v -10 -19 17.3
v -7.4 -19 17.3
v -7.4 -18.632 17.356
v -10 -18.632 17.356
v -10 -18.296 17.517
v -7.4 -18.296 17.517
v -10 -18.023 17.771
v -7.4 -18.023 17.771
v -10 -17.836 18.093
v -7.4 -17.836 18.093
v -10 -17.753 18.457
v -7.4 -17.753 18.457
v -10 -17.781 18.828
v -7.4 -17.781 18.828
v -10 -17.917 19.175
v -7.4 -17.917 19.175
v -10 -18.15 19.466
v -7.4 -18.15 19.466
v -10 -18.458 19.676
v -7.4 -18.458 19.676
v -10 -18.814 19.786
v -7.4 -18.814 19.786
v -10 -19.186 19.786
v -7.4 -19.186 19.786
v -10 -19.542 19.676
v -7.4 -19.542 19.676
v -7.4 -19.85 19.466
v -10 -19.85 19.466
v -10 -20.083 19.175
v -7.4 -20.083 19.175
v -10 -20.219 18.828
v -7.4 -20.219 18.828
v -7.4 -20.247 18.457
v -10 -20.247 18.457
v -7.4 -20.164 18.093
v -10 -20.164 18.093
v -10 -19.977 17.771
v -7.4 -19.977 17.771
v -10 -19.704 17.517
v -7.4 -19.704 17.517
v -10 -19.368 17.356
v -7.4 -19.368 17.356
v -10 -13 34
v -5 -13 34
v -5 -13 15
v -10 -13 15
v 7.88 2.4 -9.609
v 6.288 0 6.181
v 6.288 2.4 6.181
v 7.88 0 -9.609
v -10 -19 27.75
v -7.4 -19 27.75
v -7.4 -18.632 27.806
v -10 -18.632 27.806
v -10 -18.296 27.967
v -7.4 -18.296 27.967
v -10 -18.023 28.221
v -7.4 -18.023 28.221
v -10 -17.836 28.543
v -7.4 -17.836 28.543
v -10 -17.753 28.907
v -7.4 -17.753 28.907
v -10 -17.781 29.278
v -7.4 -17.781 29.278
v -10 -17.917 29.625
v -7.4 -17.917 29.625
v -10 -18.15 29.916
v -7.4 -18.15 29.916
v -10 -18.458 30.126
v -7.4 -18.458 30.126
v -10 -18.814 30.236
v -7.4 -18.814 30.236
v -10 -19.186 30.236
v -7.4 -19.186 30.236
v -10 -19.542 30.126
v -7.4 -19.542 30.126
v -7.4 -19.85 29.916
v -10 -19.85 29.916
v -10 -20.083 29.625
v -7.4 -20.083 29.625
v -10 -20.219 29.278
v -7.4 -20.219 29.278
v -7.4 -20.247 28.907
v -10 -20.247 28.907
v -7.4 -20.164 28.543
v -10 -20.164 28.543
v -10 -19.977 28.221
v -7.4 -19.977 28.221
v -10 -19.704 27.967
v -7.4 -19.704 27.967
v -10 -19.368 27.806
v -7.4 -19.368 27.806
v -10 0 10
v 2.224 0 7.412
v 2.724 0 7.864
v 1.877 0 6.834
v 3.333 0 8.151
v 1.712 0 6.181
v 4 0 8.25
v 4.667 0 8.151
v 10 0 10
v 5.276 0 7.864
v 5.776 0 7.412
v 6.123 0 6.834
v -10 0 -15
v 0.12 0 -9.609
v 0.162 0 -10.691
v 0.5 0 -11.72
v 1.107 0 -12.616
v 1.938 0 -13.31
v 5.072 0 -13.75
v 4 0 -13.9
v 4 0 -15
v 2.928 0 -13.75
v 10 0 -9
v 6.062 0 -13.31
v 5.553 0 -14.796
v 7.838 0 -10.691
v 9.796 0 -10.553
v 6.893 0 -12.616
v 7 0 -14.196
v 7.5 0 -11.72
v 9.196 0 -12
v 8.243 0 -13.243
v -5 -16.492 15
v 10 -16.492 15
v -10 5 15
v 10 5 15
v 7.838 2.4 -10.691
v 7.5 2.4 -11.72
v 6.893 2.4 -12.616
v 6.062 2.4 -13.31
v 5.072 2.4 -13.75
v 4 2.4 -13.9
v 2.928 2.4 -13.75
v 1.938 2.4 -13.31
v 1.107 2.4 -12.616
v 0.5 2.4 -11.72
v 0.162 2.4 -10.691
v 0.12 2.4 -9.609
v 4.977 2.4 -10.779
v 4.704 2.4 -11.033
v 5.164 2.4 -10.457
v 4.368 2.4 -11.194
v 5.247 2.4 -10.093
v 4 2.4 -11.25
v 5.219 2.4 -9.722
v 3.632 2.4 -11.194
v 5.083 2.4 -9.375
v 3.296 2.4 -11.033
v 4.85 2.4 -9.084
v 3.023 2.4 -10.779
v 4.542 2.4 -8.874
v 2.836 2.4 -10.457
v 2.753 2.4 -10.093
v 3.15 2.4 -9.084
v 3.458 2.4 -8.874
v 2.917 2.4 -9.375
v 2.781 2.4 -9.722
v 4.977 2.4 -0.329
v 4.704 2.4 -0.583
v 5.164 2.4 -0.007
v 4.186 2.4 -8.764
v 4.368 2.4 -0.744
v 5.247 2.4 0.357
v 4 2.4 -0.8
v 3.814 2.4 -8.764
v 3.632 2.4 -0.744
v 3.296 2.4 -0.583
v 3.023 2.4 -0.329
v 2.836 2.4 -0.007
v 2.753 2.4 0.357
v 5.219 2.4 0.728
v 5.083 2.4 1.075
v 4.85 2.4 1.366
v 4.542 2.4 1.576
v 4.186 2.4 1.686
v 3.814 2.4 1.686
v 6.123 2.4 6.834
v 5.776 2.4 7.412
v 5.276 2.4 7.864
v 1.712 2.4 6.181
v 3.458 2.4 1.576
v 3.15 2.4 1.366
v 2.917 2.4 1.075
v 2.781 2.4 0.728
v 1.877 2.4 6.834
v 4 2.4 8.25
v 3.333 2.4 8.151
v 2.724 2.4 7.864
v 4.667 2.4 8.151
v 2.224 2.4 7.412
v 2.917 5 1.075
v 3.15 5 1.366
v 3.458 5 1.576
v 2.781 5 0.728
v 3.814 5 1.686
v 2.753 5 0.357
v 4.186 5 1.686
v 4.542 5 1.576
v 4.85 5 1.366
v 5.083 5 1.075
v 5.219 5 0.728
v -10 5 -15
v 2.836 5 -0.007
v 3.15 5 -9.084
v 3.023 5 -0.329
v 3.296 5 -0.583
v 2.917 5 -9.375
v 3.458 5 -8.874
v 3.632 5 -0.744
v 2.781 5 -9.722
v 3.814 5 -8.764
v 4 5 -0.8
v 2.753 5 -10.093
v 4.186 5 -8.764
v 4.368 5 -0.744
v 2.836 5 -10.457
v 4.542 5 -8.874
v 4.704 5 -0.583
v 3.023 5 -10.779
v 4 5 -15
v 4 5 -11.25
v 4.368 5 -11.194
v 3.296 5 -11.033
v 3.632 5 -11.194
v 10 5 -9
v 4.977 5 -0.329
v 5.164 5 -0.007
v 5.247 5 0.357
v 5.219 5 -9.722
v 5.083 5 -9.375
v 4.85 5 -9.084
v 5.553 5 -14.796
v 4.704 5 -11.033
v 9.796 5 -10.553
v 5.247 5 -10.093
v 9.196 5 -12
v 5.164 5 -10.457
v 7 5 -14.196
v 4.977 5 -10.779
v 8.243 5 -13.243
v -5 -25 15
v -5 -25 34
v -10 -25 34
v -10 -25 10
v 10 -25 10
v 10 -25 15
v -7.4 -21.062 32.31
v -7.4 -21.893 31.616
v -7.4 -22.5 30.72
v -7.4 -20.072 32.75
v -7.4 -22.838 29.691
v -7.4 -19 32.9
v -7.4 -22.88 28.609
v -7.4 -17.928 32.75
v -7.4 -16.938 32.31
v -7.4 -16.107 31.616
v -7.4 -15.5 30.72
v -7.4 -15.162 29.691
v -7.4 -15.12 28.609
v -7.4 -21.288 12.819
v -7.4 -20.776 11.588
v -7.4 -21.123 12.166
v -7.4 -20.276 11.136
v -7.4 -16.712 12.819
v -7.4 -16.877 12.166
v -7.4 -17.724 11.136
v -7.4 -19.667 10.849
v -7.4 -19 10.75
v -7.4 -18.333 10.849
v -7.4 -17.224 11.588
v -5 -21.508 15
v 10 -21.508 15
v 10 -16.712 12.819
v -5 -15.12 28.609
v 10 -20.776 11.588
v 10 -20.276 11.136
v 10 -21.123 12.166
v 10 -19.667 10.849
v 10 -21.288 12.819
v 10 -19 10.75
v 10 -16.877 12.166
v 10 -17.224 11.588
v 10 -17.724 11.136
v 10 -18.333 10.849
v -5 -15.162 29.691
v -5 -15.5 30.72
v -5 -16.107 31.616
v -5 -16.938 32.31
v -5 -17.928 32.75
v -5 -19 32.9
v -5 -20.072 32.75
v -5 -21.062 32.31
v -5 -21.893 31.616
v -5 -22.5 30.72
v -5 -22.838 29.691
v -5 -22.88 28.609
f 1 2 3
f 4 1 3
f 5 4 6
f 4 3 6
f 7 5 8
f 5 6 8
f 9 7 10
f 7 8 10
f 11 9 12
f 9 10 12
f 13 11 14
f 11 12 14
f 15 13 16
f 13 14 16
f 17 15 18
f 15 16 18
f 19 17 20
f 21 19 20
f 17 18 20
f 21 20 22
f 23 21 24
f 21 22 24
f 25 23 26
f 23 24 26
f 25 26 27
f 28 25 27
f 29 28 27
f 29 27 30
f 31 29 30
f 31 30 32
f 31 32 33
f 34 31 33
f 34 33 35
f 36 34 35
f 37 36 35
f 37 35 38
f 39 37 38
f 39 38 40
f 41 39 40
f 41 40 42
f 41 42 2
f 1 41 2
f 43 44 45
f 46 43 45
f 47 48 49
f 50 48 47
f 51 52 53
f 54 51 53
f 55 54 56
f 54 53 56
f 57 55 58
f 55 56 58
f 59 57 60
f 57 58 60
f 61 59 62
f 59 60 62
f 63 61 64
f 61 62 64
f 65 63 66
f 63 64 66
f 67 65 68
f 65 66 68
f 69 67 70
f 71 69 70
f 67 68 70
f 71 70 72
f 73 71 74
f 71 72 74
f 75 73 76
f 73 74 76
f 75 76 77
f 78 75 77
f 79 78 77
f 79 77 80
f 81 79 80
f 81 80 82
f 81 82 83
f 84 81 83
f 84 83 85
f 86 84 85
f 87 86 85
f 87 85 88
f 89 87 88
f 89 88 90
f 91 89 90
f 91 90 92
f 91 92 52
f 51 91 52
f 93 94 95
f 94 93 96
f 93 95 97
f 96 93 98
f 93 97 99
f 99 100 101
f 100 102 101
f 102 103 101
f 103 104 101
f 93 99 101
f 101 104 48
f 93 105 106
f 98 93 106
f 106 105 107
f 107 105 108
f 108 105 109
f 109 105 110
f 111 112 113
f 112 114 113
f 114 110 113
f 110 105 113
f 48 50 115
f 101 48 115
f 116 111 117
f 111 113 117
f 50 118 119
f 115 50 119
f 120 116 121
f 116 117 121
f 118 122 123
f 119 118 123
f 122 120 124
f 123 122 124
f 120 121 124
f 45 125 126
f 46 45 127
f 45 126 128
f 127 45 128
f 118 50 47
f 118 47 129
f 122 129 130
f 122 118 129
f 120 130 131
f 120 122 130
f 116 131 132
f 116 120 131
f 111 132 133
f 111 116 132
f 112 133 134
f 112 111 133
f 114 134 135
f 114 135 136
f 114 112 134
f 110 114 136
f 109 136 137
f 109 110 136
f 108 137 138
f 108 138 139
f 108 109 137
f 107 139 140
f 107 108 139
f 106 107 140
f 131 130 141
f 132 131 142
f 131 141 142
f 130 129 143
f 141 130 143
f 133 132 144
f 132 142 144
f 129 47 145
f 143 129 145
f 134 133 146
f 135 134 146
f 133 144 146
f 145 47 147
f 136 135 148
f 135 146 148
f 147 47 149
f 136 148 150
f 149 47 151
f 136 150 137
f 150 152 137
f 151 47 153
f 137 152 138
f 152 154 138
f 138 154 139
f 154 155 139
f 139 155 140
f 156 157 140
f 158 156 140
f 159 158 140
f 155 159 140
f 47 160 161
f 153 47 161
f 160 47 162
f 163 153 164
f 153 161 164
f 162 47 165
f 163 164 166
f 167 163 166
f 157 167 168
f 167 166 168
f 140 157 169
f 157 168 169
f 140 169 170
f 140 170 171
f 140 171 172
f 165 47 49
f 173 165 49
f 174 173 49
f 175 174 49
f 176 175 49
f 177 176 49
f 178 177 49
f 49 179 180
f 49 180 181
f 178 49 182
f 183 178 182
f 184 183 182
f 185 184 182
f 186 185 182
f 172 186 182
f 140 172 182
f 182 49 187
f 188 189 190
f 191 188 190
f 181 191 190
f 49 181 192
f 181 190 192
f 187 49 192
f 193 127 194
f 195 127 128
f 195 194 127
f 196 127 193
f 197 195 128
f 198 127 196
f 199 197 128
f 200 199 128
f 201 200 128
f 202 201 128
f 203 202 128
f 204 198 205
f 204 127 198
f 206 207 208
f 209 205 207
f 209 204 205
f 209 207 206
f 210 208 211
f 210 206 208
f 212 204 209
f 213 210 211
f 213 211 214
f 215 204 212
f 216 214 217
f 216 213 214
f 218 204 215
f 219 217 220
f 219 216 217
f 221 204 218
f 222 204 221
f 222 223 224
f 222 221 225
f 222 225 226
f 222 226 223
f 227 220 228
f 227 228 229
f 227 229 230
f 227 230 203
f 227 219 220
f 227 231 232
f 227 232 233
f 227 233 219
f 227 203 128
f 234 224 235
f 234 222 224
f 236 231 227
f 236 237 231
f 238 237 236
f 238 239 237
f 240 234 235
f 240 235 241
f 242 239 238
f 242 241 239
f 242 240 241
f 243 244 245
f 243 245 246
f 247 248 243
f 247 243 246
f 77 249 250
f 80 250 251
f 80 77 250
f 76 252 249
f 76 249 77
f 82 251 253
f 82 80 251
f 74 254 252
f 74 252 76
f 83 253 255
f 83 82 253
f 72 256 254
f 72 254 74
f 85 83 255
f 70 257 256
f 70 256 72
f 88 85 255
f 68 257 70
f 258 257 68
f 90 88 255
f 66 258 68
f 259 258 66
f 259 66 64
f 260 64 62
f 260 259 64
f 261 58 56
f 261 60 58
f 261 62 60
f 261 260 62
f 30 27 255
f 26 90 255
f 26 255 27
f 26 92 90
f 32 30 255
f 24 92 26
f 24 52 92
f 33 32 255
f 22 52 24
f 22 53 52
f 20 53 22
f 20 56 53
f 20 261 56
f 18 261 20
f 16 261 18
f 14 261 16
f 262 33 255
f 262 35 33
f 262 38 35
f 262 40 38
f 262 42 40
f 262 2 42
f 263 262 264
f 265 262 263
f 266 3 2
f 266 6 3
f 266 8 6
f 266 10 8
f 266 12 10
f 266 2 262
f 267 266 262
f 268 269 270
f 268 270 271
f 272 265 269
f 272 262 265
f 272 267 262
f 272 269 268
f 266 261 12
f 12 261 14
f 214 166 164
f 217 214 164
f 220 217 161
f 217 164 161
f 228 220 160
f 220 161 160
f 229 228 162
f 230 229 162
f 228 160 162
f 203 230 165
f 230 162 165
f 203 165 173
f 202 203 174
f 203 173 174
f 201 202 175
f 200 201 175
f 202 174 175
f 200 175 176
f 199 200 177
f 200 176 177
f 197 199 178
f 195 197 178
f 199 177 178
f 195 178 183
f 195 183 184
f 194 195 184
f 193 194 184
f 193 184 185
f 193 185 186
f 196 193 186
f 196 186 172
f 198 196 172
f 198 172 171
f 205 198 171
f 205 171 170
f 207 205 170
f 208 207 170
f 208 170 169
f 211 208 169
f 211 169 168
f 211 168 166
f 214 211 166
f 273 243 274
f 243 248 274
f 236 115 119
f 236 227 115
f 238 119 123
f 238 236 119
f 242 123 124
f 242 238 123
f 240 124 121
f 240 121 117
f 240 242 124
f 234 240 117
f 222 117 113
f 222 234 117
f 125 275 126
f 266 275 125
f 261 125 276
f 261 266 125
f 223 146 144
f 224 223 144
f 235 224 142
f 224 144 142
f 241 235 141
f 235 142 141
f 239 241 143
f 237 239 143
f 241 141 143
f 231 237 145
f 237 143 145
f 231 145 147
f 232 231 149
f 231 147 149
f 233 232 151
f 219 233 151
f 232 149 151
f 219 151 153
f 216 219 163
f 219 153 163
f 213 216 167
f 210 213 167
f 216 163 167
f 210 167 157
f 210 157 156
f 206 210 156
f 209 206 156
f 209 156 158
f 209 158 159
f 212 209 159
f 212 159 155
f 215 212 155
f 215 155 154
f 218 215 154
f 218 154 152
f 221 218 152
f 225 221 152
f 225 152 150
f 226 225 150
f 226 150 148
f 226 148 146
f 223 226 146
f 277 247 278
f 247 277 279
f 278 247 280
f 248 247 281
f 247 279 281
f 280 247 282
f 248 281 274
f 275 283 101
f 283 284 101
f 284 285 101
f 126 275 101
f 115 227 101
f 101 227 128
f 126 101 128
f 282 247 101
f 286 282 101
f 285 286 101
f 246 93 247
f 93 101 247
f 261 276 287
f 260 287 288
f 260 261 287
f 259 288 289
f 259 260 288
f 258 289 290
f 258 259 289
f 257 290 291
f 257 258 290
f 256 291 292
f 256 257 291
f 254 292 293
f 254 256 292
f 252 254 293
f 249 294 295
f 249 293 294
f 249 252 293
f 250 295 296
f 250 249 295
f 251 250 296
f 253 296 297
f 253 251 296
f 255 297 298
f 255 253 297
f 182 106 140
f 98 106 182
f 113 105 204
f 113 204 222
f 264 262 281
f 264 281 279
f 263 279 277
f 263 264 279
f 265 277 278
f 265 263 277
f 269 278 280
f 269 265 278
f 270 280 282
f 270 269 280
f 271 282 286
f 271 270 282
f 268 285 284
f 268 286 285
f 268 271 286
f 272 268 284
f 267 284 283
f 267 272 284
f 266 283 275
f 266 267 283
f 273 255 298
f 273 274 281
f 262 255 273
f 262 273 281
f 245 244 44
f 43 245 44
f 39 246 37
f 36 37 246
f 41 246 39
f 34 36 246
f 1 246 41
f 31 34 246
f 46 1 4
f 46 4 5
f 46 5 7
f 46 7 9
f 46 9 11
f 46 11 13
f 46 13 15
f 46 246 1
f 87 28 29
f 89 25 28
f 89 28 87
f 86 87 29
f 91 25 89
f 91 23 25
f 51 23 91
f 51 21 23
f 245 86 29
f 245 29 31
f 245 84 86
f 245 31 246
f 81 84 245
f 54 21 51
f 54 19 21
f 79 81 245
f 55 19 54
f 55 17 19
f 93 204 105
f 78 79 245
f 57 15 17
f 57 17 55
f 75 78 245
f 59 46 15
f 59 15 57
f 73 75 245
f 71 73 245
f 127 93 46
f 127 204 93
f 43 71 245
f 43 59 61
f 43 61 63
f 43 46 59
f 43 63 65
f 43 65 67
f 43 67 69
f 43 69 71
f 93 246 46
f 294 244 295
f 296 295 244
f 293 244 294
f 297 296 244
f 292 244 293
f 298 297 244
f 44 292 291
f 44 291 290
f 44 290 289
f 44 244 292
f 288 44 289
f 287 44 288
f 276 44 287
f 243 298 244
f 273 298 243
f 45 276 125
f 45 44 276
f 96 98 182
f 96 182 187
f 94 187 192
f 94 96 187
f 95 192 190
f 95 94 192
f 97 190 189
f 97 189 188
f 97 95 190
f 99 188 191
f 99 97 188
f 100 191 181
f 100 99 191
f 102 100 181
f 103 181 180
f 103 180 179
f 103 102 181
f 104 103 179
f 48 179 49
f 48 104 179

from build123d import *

# Parameters (mm, degrees)
SKETCH1_W               = 20
SKETCH1_H               = 30
BOSS_EXTRUDE1_DEPTH     = 5
CUT_EXTRUDE1_DEPTH      = 2.4
SKETCH7_R               = 1.25
CUT_EXTRUDE4_DEPTH      = 19.214280112
BOSS_EXTRUDE2_DEPTH     = 10
SKETCH5_W               = 19
SKETCH5_H               = 12
CUT_EXTRUDE2_DEPTH      = 15
CUT_EXTRUDE3_DEPTH      = 45.788391353
CUT_EXTRUDE3_DEPTH_BACK = 2.4
SKETCH8_R               = 1.25
CUT_EXTRUDE5_DEPTH      = 46.648220119
FILLET1_R               = 6


with BuildPart() as part:
    # Sketch1 → Boss-Extrude1 (new body)
    with BuildSketch(Plane(origin=(0, 0, 0), x_dir=(1, 0, 0), z_dir=(0, 1, 0))):
        Rectangle(SKETCH1_W, SKETCH1_H)
    extrude(amount=BOSS_EXTRUDE1_DEPTH)

    # Sketch2 → Cut-Extrude1 (cut)
    with BuildSketch(Plane.XZ):
        with BuildLine():
            Line((0.119672063, -9.608777429), (1.711601473, 6.180721003))
            ThreePointArc((1.711601473, 6.180721003), (4, 8.25), (6.288398527, 6.180721003))
            Line((6.288398527, 6.180721003), (7.880327937, -9.608777429))
            ThreePointArc((7.880327937, -9.608777429), (4, -13.9), (0.119672063, -9.608777429))
        make_face()
    extrude(amount=-CUT_EXTRUDE1_DEPTH, mode=Mode.SUBTRACT)

    # Sketch7 → Cut-Extrude4 (cut, through all)
    with BuildSketch(Plane.XZ.offset(-2.4)):
        with Locations(Location((4, -10, 0), (0, 0, 270))):
            Circle(SKETCH7_R)
        with Locations(Location((4, 0.45, 0), (0, 0, 270))):
            Circle(SKETCH7_R)
    extrude(amount=-CUT_EXTRUDE4_DEPTH, mode=Mode.SUBTRACT)

    # Sketch4 → Boss-Extrude2 (add, symmetric)
    with BuildSketch(Plane(origin=(0, 0, 0), x_dir=(0, 0, -1), z_dir=(1, 0, 0))):
        Polygon((-15, 0), (-10, 0), (-10, -25), (-15, -25), (-34, -25), (-34, -13), (-15, -13), align=None)
    extrude(amount=BOSS_EXTRUDE2_DEPTH, both=True)

    # Sketch5 → Cut-Extrude2 (cut)
    with BuildSketch(Plane(origin=(10, 0, 0), x_dir=(0, 0, -1), z_dir=(1, 0, 0))):
        with Locations((-24.5, -19)):
            Rectangle(SKETCH5_W, SKETCH5_H)
    extrude(amount=-CUT_EXTRUDE2_DEPTH, mode=Mode.SUBTRACT)

    # Sketch6 → Cut-Extrude3 (cut, two sides: drawn at the far end of the back side and taken through both)
    with BuildSketch(Plane(origin=(-5, 0, 0), x_dir=(0, 0, -1), z_dir=(1, 0, 0)).offset(-CUT_EXTRUDE3_DEPTH_BACK)):
        with BuildLine():
            Line((-28.608777429, -22.880327937), (-12.819278997, -21.288398527))
            ThreePointArc((-12.819278997, -21.288398527), (-10.75, -19), (-12.819278997, -16.711601473))
            Line((-12.819278997, -16.711601473), (-28.608777429, -15.119672063))
            ThreePointArc((-28.608777429, -15.119672063), (-32.9, -19), (-28.608777429, -22.880327937))
        make_face()
    extrude(amount=CUT_EXTRUDE3_DEPTH + CUT_EXTRUDE3_DEPTH_BACK, mode=Mode.SUBTRACT)

    # Sketch8 → Cut-Extrude5 (cut, through all)
    with BuildSketch(Plane(origin=(-7.4, 0, 0), x_dir=(0, 0, -1), z_dir=(1, 0, 0))):
        with Locations((-29, -19)):
            Circle(SKETCH8_R)
        with Locations((-18.55, -19)):
            Circle(SKETCH8_R)
    extrude(amount=-CUT_EXTRUDE5_DEPTH, mode=Mode.SUBTRACT)

    # Fillet1
    fillet1_edges = [part.edges().sort_by_distance(p)[0] for p in [
        (10, 2.5, -15),
    ]]
    fillet(fillet1_edges, radius=FILLET1_R)


solid = part.part
